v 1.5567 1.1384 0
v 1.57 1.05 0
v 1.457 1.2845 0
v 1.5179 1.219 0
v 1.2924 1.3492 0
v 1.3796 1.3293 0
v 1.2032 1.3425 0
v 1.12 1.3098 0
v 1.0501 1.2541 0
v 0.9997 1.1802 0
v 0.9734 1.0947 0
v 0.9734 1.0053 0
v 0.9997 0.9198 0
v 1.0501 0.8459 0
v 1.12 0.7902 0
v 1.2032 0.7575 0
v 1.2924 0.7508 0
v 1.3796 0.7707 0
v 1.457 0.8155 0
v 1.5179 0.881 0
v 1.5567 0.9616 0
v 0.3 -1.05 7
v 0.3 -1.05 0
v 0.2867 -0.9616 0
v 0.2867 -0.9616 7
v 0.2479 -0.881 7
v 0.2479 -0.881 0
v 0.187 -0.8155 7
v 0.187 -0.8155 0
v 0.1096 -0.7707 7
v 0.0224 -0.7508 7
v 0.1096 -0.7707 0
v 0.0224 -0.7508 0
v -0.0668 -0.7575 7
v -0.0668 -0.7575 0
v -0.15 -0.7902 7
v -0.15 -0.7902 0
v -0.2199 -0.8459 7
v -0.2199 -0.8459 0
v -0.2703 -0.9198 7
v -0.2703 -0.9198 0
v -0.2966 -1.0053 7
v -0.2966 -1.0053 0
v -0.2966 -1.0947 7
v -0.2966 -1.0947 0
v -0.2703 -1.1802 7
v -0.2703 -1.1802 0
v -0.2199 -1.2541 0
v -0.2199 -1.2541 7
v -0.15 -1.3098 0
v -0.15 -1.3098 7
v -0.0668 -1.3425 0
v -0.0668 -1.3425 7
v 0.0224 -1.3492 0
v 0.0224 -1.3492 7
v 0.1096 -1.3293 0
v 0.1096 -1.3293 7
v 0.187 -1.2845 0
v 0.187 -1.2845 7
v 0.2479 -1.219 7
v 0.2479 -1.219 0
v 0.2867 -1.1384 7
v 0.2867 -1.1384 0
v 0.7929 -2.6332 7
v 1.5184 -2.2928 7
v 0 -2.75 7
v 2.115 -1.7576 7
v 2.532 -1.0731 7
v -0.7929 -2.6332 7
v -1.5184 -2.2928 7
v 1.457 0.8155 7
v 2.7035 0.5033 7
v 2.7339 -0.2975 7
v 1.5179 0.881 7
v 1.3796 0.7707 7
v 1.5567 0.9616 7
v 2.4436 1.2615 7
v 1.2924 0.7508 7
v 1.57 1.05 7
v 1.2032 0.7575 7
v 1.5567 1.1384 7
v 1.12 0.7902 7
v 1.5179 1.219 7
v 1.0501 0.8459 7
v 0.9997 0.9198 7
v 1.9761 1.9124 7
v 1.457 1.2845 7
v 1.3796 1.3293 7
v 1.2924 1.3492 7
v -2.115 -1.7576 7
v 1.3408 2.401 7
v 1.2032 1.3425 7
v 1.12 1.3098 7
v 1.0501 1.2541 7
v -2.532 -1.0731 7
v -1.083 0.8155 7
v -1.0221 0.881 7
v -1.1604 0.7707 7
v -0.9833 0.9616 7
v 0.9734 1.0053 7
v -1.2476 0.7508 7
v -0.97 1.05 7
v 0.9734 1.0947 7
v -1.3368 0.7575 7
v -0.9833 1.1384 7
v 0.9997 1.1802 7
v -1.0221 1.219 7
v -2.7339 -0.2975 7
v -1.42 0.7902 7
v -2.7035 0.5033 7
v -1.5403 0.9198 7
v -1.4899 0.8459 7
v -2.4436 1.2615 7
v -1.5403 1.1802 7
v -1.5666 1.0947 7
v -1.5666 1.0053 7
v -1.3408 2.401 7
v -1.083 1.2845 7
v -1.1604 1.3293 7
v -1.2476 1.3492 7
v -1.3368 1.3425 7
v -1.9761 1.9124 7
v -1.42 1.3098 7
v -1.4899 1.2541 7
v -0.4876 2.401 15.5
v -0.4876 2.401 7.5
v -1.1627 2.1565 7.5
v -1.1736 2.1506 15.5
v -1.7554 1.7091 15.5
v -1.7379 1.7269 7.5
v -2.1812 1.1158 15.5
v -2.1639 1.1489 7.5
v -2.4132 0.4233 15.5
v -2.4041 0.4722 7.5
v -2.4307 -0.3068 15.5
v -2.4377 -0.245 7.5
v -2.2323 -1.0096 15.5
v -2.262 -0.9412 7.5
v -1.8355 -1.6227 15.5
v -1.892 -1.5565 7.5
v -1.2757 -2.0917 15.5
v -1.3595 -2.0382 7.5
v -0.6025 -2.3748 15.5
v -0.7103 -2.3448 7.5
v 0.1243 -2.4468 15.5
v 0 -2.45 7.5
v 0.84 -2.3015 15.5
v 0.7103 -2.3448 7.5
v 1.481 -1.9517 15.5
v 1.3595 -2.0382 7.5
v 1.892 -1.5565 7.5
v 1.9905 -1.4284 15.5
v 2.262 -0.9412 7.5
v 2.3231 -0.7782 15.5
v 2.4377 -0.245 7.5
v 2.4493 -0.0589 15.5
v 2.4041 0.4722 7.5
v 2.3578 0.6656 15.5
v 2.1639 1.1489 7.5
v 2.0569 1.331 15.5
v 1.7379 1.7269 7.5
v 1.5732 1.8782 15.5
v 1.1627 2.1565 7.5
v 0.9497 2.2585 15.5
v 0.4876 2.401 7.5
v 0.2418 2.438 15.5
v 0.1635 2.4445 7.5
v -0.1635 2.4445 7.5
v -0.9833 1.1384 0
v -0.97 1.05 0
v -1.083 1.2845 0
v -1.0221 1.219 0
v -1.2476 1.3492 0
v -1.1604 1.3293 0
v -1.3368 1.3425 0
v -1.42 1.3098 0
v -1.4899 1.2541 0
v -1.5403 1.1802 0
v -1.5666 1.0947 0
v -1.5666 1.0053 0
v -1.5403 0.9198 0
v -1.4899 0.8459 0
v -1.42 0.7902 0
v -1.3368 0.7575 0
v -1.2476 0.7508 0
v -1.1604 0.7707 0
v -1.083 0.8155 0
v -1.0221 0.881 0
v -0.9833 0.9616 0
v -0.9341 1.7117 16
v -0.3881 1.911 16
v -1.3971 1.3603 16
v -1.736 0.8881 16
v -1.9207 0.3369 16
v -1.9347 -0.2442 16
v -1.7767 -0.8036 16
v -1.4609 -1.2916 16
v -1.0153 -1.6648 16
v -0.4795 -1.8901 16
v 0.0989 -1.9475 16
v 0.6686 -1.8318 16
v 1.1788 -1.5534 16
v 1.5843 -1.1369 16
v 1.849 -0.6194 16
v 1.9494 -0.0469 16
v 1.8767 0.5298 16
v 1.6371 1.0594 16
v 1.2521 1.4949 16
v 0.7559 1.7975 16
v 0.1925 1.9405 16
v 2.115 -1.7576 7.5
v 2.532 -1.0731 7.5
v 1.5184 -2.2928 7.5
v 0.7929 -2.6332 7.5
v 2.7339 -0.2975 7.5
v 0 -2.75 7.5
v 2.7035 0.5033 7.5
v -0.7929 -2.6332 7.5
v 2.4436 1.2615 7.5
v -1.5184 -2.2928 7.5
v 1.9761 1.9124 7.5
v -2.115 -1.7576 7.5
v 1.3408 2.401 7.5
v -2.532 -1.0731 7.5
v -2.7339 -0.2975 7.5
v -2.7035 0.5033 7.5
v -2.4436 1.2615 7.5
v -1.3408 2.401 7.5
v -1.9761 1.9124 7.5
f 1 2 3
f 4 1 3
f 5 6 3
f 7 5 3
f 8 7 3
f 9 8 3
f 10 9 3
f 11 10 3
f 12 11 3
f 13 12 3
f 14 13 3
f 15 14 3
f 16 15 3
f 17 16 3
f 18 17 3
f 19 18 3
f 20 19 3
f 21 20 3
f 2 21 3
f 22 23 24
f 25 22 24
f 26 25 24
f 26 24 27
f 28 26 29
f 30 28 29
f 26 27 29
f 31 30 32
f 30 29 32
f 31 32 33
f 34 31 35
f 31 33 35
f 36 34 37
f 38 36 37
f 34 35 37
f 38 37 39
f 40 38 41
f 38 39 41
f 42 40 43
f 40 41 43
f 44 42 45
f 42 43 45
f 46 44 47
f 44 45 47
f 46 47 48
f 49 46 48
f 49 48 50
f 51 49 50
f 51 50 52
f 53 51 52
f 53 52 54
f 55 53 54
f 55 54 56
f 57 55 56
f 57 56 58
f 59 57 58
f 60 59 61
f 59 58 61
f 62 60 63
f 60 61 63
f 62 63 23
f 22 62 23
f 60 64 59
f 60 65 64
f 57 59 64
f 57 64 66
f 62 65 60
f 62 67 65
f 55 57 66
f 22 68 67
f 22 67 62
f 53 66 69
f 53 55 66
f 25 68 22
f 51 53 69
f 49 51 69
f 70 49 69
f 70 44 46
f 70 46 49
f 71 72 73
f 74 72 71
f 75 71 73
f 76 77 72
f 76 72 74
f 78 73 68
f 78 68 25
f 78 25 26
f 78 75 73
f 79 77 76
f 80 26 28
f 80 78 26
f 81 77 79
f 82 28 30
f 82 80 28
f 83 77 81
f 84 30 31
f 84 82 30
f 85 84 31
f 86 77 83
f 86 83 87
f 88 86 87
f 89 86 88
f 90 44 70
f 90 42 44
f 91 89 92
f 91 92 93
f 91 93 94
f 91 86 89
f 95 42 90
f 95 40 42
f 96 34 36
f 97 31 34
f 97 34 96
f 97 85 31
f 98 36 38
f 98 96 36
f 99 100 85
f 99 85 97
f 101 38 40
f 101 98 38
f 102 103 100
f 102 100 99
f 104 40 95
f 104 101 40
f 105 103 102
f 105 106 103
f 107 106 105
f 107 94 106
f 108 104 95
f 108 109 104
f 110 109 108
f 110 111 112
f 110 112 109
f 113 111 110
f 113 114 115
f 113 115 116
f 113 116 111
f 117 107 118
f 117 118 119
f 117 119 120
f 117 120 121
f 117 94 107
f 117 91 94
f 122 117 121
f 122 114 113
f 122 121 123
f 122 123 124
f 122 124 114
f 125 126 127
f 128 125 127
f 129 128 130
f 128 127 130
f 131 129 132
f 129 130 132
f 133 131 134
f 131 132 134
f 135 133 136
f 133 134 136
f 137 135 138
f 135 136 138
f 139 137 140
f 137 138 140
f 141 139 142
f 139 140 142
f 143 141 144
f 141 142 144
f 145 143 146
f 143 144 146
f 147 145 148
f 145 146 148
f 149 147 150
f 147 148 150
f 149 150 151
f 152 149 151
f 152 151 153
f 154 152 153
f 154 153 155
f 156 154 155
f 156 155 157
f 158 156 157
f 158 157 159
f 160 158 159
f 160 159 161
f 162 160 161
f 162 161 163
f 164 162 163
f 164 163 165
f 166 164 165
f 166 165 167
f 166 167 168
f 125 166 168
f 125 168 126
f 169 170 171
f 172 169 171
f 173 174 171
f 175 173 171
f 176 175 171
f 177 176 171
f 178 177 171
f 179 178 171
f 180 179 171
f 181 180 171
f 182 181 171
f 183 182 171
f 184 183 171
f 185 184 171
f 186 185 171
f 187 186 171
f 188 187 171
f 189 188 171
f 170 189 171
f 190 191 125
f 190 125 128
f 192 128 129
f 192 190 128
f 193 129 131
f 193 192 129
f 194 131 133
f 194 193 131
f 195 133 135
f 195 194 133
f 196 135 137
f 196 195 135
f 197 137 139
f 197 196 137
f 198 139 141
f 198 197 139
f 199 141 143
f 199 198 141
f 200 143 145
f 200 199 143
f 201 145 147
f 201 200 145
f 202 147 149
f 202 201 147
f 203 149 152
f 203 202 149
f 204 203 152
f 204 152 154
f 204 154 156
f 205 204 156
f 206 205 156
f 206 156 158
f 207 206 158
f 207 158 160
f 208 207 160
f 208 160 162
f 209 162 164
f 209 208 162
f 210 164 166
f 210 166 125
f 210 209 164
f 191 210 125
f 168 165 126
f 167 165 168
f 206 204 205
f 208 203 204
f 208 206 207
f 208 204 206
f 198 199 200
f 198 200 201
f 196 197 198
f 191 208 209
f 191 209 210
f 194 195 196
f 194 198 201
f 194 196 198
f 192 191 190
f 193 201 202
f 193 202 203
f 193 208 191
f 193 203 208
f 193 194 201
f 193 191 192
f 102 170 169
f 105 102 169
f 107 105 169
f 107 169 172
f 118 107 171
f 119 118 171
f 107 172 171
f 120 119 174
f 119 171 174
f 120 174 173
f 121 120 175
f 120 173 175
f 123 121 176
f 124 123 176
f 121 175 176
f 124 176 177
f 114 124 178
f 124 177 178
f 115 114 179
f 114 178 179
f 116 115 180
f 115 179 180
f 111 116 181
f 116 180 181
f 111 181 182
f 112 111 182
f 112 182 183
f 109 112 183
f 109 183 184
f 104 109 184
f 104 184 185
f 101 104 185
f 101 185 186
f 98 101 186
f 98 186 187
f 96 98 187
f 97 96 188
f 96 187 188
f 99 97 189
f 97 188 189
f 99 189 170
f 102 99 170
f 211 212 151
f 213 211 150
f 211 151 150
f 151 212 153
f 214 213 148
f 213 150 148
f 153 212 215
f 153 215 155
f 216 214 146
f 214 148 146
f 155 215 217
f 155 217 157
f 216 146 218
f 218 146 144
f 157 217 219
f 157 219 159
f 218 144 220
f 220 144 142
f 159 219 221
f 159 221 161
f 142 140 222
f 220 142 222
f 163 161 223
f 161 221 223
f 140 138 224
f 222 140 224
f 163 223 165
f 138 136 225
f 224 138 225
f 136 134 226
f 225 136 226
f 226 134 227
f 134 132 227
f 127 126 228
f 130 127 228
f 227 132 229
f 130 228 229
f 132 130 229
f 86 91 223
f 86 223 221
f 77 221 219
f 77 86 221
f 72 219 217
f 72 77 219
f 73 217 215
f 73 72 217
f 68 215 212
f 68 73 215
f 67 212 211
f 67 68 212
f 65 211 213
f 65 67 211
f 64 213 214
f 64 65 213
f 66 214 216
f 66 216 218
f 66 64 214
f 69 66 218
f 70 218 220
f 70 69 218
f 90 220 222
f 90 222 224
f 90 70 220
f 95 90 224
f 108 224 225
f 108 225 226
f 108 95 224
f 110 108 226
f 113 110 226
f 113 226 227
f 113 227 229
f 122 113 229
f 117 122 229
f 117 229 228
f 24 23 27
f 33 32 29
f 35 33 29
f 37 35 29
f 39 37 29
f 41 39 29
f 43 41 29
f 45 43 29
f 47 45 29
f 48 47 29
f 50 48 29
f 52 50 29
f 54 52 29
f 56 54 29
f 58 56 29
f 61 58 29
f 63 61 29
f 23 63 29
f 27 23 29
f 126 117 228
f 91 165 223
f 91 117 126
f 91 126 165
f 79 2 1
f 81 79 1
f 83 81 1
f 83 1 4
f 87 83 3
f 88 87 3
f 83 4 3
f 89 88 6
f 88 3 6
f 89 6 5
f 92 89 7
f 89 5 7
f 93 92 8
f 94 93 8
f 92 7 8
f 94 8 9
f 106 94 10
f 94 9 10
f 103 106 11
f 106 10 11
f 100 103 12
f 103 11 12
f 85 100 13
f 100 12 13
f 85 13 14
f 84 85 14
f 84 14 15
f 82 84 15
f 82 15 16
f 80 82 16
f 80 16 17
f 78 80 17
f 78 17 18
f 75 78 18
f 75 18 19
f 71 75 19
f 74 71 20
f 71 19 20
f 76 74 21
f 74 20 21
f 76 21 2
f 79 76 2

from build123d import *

# Parameters (mm, degrees)
SKETCH_1_R        = 0.3
EXTRUDE_5_DEPTH   = 7
EXTRUDE_5_2_DEPTH = 7
EXTRUDE_5_3_DEPTH = 7
EXTRUDE_6_DEPTH   = 0.5
SKETCH_6_R        = 2.45
EXTRUDE_7_DEPTH   = 8.5
CHAMFER_1_SIZE    = 0.5


with BuildPart() as part:
    # Эскиз1 → Вытянуть5 (new body)
    with BuildSketch(Plane.XY):
        with Locations((-1.27, 1.05)):
            Circle(SKETCH_1_R)
    extrude(amount=EXTRUDE_5_DEPTH)



with BuildPart() as body_2:
    # Эскиз1 → Extrude 5 2 (new body)
    with BuildSketch(Plane.XY):
        with Locations((1.27, 1.05)):
            Circle(SKETCH_1_R)
    extrude(amount=EXTRUDE_5_2_DEPTH)


with BuildPart() as body_3:
    # Эскиз1 → Extrude 5 3 (new body)
    with BuildSketch(Plane.XY):
        with Locations((0, -1.05)):
            Circle(SKETCH_1_R)
    extrude(amount=EXTRUDE_5_3_DEPTH)


with BuildPart() as part_1:
    add(part.part)

    add(body_2.part)  # Вытянуть6 merges body 2

    add(body_3.part)  # Вытянуть6 merges body 3
    # Эскиз5 → Вытянуть6 (add)
    with BuildSketch(Plane.XY.offset(7)):
        with BuildLine():
            Line((-1.34079253, 2.400994667), (1.34079253, 2.400994667))
            ThreePointArc((1.34079253, 2.400994667), (0, -2.75), (-1.34079253, 2.400994667))
        make_face()
    extrude(amount=EXTRUDE_6_DEPTH)

    # Эскиз6 → Вытянуть7 (add)
    with BuildSketch(Plane.XY.offset(7.5)):
        with Locations(Location((0, 0, 0), (0, 0, 101.478967652))):
            Circle(SKETCH_6_R)
    extrude(amount=EXTRUDE_7_DEPTH)

    # Фаска1
    chamfer_1_edges = [part_1.edges().sort_by_distance(p)[0] for p in [
        (0.487570106, -2.400994667, 16),
    ]]
    chamfer(chamfer_1_edges, length=CHAMFER_1_SIZE)


solid = part_1.part
